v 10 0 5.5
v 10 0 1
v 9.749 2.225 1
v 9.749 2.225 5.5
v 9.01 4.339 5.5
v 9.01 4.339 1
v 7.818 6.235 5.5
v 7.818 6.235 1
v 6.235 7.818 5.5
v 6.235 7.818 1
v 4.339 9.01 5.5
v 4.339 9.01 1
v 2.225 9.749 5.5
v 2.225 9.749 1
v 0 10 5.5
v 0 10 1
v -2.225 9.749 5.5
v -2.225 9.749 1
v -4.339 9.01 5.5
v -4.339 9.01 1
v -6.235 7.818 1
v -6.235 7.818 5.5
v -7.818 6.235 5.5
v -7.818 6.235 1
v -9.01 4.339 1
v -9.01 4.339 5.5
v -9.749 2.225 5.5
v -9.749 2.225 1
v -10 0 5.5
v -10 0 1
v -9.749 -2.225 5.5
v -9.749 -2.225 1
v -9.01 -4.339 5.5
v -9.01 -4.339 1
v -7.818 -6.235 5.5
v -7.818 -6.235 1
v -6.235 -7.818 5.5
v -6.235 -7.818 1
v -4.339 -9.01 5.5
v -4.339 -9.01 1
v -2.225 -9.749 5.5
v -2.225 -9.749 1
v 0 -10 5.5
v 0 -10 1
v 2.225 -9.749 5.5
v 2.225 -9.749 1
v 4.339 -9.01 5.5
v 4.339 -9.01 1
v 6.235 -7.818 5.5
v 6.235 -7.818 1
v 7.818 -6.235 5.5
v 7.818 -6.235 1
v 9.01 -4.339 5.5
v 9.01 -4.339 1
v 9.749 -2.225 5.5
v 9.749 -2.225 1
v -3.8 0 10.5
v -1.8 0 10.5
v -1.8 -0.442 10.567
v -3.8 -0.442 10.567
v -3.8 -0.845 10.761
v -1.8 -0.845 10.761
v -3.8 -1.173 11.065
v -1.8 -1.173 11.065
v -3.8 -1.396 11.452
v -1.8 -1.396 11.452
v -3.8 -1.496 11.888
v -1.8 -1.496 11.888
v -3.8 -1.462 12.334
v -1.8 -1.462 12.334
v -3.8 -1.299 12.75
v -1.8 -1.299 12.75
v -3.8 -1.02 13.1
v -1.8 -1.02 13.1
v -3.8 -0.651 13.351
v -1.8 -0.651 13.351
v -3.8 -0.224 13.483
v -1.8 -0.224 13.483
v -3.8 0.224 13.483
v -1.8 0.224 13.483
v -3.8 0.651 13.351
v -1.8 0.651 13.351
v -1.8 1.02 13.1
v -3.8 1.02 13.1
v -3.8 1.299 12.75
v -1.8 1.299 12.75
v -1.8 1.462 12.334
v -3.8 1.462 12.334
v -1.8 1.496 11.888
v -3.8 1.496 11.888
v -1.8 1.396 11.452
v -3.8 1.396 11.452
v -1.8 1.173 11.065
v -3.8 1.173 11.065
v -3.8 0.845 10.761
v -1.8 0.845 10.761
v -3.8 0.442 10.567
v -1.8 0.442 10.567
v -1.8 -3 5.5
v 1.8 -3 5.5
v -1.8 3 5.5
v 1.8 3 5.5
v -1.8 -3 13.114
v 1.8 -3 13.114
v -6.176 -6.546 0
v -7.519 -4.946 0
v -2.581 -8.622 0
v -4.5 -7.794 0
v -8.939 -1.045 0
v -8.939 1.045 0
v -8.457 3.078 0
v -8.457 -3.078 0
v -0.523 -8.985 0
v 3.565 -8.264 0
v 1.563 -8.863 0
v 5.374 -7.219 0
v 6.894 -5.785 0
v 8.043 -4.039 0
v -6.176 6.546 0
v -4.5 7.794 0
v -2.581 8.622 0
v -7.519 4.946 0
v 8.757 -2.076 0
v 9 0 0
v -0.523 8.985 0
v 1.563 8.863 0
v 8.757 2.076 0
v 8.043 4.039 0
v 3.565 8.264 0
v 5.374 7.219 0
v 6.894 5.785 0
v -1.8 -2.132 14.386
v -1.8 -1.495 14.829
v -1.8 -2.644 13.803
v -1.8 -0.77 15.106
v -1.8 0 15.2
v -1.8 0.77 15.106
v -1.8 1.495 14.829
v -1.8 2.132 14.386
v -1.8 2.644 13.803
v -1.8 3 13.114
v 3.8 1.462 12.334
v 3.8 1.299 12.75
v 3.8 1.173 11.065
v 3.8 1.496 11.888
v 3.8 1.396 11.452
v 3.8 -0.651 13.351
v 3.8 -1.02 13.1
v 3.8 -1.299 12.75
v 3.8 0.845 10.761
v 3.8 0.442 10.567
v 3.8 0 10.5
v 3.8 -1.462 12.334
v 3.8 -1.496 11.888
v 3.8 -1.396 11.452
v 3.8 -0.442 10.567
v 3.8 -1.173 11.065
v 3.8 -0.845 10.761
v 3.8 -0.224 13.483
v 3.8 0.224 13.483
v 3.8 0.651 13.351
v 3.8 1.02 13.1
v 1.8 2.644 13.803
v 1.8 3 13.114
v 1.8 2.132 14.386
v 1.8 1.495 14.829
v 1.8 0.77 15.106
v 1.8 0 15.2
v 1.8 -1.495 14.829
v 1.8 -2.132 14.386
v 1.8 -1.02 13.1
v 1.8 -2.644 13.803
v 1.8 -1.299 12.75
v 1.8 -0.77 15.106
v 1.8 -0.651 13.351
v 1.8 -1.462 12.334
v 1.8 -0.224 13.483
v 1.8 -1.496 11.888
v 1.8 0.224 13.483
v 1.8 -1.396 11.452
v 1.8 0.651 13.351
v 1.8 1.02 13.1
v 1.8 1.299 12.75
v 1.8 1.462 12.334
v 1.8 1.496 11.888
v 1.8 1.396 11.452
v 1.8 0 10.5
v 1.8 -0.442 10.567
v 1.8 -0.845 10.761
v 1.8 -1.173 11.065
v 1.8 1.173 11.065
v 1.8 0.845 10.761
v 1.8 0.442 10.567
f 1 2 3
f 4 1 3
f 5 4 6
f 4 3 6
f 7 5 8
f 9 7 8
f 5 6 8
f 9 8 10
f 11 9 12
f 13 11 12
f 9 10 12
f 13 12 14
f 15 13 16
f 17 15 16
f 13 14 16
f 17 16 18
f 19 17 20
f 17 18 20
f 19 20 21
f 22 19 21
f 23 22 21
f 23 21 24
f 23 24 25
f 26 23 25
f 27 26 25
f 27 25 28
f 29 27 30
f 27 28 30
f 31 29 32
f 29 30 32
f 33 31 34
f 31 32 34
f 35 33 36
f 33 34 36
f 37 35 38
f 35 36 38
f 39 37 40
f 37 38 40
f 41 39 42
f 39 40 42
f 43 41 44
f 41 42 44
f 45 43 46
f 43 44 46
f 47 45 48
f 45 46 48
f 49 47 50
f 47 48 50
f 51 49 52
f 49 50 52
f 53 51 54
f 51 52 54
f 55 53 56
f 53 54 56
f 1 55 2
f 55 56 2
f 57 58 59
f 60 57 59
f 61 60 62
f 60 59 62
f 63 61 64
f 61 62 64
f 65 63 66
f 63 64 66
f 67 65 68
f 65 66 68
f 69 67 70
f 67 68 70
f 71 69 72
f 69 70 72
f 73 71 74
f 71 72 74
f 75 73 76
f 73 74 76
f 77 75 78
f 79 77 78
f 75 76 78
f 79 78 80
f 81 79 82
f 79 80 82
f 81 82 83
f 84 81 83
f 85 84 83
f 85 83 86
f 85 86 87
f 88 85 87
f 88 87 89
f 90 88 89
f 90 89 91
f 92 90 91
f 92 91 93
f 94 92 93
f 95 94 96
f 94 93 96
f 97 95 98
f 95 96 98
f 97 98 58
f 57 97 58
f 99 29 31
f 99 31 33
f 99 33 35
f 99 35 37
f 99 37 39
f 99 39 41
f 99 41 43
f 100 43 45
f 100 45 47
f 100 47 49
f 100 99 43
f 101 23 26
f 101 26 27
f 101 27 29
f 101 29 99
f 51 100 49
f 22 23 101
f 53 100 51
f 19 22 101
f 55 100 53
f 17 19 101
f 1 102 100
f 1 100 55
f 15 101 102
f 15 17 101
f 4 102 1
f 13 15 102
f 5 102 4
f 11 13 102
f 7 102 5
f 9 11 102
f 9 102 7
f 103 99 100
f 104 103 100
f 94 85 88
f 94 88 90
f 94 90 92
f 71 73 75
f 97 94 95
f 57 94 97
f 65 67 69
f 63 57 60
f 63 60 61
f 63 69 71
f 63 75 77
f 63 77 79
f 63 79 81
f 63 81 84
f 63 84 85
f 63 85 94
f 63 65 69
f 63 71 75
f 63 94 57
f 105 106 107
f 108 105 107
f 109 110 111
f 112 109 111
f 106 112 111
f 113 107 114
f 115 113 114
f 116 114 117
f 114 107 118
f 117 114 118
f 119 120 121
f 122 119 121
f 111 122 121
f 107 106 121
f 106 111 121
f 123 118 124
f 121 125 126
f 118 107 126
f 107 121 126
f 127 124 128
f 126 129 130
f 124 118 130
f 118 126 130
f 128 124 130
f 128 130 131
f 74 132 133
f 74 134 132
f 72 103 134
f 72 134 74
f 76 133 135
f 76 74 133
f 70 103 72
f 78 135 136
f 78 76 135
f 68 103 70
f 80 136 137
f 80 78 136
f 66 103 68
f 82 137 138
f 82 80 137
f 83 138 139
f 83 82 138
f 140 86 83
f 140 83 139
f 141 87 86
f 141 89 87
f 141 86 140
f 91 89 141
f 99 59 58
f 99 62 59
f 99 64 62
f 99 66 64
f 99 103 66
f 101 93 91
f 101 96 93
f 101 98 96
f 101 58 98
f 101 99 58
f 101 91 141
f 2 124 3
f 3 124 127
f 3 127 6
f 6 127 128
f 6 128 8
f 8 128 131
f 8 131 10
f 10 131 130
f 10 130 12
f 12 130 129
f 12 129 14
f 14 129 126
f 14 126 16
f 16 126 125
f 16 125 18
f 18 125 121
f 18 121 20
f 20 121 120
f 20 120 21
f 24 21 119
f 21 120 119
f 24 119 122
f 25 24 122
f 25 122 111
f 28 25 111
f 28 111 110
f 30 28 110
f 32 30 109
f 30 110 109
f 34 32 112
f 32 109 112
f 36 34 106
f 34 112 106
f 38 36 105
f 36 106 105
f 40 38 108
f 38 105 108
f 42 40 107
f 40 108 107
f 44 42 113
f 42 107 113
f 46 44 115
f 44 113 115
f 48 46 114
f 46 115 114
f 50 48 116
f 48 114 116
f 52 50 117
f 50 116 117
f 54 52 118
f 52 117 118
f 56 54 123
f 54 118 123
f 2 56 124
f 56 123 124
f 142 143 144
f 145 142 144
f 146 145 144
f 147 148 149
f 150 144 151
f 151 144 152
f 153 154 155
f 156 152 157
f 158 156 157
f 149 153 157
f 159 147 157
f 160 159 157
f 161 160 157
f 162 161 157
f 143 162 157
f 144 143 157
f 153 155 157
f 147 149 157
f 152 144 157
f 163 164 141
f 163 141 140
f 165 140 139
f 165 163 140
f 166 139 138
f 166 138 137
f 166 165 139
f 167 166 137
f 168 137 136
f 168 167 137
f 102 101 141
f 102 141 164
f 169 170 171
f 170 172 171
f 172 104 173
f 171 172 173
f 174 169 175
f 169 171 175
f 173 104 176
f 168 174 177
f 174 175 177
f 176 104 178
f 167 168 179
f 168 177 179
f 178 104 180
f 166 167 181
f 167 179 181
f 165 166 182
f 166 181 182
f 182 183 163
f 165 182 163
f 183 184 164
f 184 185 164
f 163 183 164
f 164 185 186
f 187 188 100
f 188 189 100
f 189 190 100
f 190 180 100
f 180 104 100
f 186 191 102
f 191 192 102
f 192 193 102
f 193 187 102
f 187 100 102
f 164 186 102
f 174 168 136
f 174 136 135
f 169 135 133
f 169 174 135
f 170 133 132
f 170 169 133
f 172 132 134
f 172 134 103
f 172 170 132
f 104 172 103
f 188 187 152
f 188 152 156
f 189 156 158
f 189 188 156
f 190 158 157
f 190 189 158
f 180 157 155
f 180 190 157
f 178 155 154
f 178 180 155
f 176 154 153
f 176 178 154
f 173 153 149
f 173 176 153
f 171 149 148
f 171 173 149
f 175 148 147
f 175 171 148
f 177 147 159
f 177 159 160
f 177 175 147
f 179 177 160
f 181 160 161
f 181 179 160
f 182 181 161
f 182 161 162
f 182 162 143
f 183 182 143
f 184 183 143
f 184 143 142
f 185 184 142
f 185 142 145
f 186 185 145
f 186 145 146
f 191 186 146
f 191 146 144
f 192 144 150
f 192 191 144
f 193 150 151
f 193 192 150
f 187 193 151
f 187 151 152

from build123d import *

# Parameters (mm, degrees)
SKETCH_1_R          = 10
EXTRUDE_1_DEPTH     = 5.5
SKETCH_2_W          = 3.6
SKETCH_2_H          = 6
EXTRUDE_2_DEPTH     = 9.7
CUT_EXTRUDE_START   = -3.6
CUT_EXTRUDE_1_DEPTH = 3.6
CHAMFER_1_SIZE      = 1
SKETCH_4_R          = 1.5
EXTRUDE_3_DEPTH     = 2


# Read off the part's stored shape, not the designer's step: 切除-拉伸1
with BuildPart() as part:
    # 草图1 → 凸台-拉伸1 (new body)
    with BuildSketch(Plane.XY):
        Circle(SKETCH_1_R)
    extrude(amount=EXTRUDE_1_DEPTH)

    # 草图2 → 凸台-拉伸2 (add)
    with BuildSketch(Plane.XY.offset(5.5)):
        Rectangle(SKETCH_2_W, SKETCH_2_H)
    extrude(amount=EXTRUDE_2_DEPTH)

    # 切除-拉伸1 outline → 切除-拉伸1 (cut)
    with BuildSketch(Plane.ZY.offset(1.8).offset(CUT_EXTRUDE_START)):
        with BuildLine():
            Line((15.2, 3), (13.113552873, 3))
            ThreePointArc((13.113552873, 3), (14.627105745, 1.827105745), (15.2, 0))
            Line((15.2, 0), (15.2, 3))
        make_face()
        with BuildLine():
            Line((15.2, -3), (15.2, 0))
            ThreePointArc((15.2, 0), (14.627105745, -1.827105745), (13.113552873, -3))
            Line((13.113552873, -3), (15.2, -3))
        make_face()
    extrude(amount=CUT_EXTRUDE_1_DEPTH, mode=Mode.SUBTRACT)

    # 倒角1
    chamfer_1_edges = [part.edges().sort_by_distance(p)[0] for p in [
        (-10, 0, 0),
    ]]
    chamfer(chamfer_1_edges, length=CHAMFER_1_SIZE)

    # 草图4 → 凸台-拉伸3 (add)
    with BuildSketch(Plane.ZY.offset(1.8)):
        with Locations(Location((12, 0, 0), (0, 0, 180))):
            Circle(SKETCH_4_R)
    extrude_3 = extrude(amount=EXTRUDE_3_DEPTH)

    # 镜向1: 凸台-拉伸3 across plane
    add(extrude_3.mirror(Plane(origin=(0, 0, 0), x_dir=(0, 0, 1), z_dir=(1, 0, 0))))


solid = part.part
